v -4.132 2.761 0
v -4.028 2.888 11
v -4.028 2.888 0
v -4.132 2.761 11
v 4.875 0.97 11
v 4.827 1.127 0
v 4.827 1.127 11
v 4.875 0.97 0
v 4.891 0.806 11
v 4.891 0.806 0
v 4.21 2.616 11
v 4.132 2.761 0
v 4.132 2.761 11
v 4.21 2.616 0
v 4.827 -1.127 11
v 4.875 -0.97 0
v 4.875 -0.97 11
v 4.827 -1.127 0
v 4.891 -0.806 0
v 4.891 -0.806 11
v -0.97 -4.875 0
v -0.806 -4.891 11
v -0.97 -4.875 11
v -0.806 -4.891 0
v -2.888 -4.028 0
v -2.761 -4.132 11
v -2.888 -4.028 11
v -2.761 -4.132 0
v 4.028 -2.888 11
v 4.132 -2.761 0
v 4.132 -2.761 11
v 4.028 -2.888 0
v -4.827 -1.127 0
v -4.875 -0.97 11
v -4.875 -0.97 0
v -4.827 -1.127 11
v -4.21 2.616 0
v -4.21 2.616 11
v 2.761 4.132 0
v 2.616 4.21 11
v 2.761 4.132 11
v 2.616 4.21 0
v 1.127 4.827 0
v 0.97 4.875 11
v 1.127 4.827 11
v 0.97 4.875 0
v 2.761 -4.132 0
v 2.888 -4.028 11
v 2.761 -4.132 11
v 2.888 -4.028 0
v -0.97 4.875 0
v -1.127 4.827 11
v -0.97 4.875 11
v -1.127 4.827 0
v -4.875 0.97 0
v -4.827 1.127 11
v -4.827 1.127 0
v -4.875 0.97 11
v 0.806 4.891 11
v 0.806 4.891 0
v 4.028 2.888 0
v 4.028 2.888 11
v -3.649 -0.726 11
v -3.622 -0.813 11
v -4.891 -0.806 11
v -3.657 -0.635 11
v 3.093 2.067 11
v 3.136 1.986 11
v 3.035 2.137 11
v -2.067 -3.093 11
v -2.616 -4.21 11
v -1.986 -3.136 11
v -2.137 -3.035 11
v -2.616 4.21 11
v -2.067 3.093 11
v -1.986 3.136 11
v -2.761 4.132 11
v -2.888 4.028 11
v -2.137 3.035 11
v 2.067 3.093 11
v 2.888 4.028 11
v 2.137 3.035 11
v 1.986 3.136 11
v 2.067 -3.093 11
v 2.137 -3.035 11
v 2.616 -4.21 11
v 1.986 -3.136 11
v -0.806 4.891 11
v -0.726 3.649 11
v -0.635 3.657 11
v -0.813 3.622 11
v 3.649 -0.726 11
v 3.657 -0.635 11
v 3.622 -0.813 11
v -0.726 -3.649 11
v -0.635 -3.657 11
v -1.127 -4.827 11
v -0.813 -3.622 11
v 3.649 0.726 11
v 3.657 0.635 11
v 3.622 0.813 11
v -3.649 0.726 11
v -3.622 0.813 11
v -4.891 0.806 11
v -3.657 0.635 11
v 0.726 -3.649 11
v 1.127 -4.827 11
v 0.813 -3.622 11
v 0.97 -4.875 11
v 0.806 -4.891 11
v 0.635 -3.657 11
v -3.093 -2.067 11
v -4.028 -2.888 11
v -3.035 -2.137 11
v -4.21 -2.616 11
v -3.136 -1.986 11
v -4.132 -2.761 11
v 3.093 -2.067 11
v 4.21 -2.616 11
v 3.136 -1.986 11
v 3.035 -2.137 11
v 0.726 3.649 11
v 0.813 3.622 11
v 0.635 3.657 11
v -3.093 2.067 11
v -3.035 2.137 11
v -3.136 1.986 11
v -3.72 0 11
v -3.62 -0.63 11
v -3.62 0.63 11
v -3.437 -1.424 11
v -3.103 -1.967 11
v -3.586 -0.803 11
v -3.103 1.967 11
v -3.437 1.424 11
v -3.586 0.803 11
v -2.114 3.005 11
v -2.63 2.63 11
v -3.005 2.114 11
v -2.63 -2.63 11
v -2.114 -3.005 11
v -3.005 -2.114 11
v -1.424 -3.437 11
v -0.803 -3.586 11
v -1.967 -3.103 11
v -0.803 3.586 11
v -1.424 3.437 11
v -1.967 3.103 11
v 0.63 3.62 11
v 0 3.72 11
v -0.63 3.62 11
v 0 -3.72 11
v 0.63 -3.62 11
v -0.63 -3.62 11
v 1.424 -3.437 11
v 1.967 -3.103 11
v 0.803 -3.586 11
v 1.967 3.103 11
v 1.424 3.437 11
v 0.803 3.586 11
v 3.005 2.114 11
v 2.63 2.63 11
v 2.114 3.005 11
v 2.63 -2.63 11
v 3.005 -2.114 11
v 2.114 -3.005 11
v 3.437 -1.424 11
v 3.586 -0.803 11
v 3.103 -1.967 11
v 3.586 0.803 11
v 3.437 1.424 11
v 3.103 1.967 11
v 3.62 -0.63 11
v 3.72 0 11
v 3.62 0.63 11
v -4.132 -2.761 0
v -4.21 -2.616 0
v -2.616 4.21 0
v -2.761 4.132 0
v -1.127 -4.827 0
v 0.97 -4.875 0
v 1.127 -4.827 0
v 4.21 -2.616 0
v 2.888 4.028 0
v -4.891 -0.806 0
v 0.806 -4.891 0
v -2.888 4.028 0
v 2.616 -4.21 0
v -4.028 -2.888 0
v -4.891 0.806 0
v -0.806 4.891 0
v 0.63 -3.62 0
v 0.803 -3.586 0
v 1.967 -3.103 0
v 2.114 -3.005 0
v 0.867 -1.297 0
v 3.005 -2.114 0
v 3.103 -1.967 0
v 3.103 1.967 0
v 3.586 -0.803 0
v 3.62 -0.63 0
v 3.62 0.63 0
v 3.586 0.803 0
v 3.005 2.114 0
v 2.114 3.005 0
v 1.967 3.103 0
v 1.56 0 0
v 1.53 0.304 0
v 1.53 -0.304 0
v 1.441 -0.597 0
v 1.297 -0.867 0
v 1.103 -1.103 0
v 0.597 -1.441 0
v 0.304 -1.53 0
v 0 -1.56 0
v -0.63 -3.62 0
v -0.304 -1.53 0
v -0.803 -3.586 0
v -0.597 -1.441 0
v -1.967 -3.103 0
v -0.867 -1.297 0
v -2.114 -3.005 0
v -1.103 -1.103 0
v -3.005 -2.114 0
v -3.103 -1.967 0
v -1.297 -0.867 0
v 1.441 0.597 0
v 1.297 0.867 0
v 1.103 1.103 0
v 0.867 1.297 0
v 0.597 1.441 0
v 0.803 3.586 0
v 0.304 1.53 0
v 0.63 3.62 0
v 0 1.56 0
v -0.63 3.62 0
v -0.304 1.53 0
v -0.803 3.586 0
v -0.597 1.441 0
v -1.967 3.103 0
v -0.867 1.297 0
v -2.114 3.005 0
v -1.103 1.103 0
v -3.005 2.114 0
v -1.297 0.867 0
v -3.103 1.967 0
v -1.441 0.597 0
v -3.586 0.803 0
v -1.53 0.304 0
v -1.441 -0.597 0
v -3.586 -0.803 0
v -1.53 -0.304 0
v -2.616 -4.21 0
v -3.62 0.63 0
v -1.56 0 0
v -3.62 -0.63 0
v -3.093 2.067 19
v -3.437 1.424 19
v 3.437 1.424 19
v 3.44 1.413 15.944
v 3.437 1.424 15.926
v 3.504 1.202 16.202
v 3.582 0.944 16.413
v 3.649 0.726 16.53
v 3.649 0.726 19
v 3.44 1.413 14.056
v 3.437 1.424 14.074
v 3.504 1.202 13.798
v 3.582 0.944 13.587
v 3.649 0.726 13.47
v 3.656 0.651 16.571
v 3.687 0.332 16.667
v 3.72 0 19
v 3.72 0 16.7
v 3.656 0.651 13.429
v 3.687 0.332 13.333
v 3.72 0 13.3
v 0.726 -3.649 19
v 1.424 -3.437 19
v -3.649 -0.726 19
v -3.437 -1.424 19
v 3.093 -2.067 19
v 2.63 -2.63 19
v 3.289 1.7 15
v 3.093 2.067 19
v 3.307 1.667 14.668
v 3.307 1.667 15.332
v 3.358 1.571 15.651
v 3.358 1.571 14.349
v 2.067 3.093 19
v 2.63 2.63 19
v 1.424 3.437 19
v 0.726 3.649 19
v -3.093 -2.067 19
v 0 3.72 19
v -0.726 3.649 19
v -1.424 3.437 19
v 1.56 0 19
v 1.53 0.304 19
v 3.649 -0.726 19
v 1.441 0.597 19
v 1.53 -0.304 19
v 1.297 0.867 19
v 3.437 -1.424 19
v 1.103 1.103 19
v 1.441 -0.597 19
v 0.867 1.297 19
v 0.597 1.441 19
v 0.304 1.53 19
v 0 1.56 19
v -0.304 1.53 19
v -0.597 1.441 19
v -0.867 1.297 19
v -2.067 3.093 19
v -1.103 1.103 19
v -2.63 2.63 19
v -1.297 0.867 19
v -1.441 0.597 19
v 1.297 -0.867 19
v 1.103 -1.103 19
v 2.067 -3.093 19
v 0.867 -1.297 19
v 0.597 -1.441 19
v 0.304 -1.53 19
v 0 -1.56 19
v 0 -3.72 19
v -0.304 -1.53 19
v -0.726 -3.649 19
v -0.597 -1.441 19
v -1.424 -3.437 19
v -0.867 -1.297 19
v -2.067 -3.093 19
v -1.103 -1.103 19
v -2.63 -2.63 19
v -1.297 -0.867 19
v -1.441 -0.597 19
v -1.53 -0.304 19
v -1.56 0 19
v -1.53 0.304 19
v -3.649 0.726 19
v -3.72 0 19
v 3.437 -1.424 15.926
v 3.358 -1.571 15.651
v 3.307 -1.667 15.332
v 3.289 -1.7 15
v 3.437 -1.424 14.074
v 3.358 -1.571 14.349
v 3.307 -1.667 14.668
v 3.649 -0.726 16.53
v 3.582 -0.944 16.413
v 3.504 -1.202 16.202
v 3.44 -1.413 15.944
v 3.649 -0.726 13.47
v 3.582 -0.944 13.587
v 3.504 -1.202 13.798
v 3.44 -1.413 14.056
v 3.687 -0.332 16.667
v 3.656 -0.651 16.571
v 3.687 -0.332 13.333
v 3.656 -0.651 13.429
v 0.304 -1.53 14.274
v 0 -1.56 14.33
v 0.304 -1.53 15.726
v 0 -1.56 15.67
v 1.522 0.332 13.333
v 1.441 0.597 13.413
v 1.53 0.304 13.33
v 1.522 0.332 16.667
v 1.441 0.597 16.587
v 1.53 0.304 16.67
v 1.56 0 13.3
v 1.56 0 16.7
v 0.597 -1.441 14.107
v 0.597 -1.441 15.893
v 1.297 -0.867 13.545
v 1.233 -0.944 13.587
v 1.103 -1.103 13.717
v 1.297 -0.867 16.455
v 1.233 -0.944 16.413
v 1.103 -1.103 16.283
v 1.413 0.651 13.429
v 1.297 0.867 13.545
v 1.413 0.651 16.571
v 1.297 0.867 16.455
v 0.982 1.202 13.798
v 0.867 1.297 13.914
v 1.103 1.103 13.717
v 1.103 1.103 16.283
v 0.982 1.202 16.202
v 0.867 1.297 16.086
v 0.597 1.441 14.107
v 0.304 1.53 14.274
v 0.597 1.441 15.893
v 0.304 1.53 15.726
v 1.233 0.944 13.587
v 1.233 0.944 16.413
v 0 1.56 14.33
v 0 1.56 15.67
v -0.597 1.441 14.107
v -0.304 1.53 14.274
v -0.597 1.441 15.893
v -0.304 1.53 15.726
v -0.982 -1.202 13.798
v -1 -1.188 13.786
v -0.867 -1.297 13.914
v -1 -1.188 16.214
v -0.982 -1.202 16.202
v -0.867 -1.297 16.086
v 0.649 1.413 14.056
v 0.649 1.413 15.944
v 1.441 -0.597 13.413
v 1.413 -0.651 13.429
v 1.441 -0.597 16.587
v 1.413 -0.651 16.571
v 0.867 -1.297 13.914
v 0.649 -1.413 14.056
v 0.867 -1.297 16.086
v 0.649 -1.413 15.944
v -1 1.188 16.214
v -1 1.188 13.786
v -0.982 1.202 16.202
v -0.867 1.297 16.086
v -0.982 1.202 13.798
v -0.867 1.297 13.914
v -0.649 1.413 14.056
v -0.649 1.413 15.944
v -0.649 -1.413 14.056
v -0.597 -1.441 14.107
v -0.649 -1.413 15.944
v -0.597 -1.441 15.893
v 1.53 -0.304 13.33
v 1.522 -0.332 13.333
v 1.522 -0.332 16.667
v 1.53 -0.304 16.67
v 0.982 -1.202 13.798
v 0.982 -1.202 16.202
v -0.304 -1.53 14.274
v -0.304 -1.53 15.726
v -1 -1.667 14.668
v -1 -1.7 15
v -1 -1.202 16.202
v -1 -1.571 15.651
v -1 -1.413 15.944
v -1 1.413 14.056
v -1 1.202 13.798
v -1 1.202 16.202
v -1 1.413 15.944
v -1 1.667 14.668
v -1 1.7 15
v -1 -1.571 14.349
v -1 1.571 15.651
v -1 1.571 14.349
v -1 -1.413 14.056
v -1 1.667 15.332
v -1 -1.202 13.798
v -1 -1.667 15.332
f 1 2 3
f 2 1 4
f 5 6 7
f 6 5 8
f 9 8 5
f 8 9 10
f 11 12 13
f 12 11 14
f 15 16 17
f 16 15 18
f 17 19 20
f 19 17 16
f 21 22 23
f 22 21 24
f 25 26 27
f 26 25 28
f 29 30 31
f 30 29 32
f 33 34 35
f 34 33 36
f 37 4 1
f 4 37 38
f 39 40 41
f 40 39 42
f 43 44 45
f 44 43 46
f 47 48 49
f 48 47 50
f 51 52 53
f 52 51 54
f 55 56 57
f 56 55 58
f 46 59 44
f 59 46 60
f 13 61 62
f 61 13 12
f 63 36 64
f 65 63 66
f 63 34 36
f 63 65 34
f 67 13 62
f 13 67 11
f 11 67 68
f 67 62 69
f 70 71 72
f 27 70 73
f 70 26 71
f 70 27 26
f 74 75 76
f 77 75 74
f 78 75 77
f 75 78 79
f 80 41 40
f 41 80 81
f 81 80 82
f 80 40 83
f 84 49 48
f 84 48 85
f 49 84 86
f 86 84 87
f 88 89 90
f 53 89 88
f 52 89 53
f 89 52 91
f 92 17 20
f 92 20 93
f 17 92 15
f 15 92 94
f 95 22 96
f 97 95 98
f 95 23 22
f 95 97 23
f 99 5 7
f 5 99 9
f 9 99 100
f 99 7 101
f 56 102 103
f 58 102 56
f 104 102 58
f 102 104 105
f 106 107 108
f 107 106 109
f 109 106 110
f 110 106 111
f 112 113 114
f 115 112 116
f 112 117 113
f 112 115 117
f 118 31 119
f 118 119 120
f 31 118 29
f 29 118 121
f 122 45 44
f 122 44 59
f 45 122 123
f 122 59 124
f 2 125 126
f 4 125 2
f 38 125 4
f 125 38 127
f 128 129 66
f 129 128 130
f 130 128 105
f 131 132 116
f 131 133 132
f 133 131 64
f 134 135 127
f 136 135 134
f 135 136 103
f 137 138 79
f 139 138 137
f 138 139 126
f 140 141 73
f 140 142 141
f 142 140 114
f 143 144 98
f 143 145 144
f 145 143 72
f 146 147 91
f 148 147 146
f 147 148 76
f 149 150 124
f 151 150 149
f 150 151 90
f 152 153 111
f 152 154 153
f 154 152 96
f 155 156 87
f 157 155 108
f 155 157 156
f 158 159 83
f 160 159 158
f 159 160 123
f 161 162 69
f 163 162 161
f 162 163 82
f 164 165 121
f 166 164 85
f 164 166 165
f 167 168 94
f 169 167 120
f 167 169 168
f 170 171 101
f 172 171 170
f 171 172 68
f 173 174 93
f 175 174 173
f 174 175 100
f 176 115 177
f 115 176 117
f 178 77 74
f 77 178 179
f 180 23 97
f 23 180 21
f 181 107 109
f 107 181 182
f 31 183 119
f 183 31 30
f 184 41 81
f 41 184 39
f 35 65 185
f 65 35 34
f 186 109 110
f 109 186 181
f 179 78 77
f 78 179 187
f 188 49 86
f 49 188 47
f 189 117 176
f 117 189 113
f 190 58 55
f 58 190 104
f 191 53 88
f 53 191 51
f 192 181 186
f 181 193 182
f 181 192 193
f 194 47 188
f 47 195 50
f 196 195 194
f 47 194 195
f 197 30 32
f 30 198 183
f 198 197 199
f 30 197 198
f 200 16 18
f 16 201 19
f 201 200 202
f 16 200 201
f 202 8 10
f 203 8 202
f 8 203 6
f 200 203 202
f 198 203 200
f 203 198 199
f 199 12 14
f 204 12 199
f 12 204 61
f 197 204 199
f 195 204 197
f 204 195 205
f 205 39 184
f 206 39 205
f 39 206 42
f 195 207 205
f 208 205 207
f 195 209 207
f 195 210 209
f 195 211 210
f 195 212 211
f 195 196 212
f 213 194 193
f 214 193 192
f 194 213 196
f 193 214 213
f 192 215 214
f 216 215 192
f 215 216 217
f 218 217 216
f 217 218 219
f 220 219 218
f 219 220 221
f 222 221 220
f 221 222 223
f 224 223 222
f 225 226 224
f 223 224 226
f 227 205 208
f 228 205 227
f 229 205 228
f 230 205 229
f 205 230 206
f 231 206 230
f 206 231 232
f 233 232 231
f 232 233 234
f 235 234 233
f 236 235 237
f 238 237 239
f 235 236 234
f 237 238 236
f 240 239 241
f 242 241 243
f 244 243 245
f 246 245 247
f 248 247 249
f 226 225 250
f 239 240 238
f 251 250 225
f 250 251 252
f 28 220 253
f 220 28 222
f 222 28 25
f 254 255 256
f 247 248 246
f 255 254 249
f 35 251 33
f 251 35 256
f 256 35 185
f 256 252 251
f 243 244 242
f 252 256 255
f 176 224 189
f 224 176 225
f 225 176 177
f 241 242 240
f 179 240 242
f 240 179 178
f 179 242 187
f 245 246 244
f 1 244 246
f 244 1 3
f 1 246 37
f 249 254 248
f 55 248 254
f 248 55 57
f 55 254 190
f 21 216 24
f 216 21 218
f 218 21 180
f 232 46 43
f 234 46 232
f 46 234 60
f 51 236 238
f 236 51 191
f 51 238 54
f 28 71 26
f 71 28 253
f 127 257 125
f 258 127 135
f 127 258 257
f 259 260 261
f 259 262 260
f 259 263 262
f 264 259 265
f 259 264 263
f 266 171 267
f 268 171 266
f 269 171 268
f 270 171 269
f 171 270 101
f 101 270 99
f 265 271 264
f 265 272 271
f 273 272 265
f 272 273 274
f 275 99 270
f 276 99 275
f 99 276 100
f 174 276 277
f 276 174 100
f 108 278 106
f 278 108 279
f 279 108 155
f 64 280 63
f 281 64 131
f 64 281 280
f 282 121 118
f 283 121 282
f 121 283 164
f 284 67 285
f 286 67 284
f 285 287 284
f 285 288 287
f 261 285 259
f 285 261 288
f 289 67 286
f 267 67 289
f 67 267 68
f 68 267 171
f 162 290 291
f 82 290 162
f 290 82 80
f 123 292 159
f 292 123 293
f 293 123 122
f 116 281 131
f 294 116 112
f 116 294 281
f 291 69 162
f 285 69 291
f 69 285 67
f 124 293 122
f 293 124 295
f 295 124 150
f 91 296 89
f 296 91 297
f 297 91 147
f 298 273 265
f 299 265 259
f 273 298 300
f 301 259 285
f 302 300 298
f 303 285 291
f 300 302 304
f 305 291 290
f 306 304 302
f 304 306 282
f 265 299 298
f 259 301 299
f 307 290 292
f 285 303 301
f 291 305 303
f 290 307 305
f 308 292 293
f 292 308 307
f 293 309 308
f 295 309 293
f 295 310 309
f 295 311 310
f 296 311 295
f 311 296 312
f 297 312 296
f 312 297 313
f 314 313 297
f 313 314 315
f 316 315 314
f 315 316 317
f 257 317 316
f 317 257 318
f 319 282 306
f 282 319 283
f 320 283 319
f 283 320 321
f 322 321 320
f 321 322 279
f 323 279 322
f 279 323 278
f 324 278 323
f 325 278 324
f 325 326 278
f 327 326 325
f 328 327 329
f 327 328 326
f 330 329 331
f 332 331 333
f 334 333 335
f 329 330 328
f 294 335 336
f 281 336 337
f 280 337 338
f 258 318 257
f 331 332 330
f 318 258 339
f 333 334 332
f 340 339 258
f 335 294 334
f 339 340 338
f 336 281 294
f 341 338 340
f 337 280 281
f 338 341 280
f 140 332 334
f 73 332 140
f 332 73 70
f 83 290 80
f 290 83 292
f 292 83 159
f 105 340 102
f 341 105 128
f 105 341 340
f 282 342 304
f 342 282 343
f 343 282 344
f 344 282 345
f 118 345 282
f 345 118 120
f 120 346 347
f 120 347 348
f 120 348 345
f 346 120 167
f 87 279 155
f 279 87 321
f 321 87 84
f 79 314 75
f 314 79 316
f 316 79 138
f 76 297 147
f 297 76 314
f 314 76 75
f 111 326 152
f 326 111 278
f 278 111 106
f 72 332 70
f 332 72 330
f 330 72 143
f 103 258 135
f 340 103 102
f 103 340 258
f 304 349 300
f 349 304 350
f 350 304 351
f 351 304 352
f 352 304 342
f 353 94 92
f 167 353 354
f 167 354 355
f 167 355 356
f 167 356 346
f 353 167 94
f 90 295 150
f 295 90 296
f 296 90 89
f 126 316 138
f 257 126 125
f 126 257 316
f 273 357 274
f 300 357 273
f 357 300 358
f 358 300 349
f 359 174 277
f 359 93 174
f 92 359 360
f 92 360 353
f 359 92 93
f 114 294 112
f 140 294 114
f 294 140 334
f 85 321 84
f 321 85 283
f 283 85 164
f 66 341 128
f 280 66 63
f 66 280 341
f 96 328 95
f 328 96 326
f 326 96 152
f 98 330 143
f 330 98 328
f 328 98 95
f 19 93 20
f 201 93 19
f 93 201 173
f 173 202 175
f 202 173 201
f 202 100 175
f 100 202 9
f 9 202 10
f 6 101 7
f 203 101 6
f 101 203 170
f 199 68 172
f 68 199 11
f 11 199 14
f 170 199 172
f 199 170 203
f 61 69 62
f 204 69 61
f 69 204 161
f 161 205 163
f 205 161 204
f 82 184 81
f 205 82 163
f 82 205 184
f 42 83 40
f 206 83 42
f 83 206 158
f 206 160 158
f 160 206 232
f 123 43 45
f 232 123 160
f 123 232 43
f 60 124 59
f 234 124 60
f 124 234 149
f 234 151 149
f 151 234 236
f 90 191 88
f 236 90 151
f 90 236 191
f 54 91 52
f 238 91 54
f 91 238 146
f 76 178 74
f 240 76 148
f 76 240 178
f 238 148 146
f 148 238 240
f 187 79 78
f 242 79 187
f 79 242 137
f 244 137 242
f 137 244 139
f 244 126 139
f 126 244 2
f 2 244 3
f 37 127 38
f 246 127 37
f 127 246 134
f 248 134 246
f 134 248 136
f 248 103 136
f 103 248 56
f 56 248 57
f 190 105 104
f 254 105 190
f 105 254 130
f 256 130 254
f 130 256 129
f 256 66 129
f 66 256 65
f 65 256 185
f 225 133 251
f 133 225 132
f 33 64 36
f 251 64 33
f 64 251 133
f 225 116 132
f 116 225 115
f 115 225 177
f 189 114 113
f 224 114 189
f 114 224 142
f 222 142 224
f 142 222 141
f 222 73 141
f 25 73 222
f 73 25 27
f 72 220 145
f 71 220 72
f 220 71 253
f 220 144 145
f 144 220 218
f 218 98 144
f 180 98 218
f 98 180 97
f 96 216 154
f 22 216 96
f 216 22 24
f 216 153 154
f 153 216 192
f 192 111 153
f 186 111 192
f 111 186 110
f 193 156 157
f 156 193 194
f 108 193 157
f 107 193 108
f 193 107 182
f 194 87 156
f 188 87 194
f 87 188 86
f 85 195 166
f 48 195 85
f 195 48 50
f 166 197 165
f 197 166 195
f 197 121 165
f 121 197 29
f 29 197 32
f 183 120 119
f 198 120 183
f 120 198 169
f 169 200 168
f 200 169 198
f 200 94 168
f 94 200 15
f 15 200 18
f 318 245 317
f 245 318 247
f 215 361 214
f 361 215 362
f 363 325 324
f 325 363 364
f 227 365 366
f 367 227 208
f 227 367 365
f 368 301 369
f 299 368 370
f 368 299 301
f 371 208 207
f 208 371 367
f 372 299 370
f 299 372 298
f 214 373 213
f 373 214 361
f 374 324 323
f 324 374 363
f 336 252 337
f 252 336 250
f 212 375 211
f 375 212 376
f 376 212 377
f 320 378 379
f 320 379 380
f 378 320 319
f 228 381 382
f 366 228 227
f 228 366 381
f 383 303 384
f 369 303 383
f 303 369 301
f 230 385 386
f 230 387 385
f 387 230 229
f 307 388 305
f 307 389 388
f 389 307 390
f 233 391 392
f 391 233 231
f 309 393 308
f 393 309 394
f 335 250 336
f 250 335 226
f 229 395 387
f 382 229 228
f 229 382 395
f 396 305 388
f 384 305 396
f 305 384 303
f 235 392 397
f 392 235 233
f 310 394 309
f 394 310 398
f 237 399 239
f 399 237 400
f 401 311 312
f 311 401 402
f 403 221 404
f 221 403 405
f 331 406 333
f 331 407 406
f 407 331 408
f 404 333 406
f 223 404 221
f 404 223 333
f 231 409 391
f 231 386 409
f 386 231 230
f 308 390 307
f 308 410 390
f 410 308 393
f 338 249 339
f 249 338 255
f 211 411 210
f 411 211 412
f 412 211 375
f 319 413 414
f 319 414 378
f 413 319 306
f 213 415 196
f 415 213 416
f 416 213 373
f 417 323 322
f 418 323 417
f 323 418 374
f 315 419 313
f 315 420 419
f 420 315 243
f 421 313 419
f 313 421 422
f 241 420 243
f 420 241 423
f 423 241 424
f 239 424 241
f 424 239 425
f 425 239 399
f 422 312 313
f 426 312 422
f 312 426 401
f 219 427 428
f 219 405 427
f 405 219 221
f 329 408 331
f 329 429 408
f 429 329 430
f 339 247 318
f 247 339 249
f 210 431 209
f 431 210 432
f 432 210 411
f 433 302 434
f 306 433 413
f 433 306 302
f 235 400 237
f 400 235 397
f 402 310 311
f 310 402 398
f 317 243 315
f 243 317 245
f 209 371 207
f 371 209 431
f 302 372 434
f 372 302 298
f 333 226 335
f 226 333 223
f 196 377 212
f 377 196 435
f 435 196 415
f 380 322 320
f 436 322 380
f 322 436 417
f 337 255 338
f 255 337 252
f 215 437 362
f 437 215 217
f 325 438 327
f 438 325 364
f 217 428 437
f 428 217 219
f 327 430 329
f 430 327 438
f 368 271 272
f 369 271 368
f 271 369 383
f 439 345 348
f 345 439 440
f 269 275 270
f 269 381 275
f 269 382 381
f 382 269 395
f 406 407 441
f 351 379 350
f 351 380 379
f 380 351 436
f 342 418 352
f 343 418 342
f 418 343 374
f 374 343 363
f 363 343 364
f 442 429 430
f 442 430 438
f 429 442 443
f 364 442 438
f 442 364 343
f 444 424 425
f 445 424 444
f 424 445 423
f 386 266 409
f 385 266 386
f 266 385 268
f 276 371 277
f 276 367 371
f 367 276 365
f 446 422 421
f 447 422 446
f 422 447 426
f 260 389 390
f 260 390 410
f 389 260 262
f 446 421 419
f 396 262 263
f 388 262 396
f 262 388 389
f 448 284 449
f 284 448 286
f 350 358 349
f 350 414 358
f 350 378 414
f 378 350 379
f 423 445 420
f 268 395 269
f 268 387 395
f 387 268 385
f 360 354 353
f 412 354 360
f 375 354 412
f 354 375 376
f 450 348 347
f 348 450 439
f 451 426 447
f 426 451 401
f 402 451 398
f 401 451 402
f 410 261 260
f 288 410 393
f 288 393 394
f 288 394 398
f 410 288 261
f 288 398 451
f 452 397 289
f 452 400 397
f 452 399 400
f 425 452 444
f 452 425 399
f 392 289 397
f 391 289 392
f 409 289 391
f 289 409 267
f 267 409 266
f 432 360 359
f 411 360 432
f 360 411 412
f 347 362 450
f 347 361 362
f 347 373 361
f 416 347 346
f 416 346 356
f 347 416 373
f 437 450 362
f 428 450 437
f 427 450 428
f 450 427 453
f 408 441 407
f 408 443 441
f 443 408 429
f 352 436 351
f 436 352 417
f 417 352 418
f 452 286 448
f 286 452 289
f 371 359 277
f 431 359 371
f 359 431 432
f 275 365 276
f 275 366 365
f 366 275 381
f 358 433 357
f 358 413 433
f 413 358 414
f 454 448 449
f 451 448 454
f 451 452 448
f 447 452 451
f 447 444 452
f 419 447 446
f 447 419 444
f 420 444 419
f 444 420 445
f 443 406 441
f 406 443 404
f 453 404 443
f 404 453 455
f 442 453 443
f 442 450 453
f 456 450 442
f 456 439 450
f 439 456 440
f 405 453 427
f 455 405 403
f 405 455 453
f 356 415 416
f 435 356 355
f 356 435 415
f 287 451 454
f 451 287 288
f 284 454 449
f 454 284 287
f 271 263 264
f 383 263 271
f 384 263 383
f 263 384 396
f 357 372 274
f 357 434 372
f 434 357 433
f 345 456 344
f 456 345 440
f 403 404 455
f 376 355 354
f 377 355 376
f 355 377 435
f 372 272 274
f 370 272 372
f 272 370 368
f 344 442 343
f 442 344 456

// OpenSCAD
$fn = 32;

// ----------------------------------------------------------------------
// Timing pulley: GT2 16T, pitch 2 mm, 9.94 mm x 19 mm
// ----------------------------------------------------------------------

// --- parameters (mm) ---
belt_pitch = 2;           // belt pitch
n_teeth = 16;             // number of grooves
rim_w = 11;               // belt width between the flanges
tip_d = 9.94;             // tip circle diameter
root_d = 8.44;            // groove bottom diameter
groove_h = 0.75;          // groove depth
tooth_w = 1.5;            // groove width at the tip circle
shaft_d = 3.12;           // shaft bore
hub_d = 7.44;             // hub diameter
hub_h = 8;                // hub above the flange
bottom_z = 0;             // lowest point of the pulley
top_z = 19;               // highest point of the pulley
set_d = 3.4;              // set screw tap hole

module rim() {
  cylinder(h = rim_w, d = tip_d);
}

module groove_cutter() {
  /* belt tooth groove: deeper than wide, cut through the belt width */
  translate([root_d / 2, 0, 0])
    linear_extrude(height = rim_w)
      polygon(points = [[-0.6, -tooth_w * 0.42], [groove_h + 0.6, -tooth_w * 0.6],
                        [groove_h + 0.6, tooth_w * 0.6], [-0.6, tooth_w * 0.42]]);
}

module hub() {
  translate([0, 0, bottom_z]) cylinder(h = top_z - bottom_z, d = hub_d);
}

difference() {
  union() {
    rim();
    hub();
  }
  for (i = [0 : n_teeth - 1]) rotate([0, 0, i * 360 / n_teeth]) groove_cutter();
  translate([0, 0, bottom_z - 1]) cylinder(h = top_z - bottom_z + 2, d = shaft_d);
  translate([-1, 0, top_z - hub_h * 0.5]) rotate([0, 90, 0]) cylinder(h = hub_d / 2 + 3, d = set_d);
}
